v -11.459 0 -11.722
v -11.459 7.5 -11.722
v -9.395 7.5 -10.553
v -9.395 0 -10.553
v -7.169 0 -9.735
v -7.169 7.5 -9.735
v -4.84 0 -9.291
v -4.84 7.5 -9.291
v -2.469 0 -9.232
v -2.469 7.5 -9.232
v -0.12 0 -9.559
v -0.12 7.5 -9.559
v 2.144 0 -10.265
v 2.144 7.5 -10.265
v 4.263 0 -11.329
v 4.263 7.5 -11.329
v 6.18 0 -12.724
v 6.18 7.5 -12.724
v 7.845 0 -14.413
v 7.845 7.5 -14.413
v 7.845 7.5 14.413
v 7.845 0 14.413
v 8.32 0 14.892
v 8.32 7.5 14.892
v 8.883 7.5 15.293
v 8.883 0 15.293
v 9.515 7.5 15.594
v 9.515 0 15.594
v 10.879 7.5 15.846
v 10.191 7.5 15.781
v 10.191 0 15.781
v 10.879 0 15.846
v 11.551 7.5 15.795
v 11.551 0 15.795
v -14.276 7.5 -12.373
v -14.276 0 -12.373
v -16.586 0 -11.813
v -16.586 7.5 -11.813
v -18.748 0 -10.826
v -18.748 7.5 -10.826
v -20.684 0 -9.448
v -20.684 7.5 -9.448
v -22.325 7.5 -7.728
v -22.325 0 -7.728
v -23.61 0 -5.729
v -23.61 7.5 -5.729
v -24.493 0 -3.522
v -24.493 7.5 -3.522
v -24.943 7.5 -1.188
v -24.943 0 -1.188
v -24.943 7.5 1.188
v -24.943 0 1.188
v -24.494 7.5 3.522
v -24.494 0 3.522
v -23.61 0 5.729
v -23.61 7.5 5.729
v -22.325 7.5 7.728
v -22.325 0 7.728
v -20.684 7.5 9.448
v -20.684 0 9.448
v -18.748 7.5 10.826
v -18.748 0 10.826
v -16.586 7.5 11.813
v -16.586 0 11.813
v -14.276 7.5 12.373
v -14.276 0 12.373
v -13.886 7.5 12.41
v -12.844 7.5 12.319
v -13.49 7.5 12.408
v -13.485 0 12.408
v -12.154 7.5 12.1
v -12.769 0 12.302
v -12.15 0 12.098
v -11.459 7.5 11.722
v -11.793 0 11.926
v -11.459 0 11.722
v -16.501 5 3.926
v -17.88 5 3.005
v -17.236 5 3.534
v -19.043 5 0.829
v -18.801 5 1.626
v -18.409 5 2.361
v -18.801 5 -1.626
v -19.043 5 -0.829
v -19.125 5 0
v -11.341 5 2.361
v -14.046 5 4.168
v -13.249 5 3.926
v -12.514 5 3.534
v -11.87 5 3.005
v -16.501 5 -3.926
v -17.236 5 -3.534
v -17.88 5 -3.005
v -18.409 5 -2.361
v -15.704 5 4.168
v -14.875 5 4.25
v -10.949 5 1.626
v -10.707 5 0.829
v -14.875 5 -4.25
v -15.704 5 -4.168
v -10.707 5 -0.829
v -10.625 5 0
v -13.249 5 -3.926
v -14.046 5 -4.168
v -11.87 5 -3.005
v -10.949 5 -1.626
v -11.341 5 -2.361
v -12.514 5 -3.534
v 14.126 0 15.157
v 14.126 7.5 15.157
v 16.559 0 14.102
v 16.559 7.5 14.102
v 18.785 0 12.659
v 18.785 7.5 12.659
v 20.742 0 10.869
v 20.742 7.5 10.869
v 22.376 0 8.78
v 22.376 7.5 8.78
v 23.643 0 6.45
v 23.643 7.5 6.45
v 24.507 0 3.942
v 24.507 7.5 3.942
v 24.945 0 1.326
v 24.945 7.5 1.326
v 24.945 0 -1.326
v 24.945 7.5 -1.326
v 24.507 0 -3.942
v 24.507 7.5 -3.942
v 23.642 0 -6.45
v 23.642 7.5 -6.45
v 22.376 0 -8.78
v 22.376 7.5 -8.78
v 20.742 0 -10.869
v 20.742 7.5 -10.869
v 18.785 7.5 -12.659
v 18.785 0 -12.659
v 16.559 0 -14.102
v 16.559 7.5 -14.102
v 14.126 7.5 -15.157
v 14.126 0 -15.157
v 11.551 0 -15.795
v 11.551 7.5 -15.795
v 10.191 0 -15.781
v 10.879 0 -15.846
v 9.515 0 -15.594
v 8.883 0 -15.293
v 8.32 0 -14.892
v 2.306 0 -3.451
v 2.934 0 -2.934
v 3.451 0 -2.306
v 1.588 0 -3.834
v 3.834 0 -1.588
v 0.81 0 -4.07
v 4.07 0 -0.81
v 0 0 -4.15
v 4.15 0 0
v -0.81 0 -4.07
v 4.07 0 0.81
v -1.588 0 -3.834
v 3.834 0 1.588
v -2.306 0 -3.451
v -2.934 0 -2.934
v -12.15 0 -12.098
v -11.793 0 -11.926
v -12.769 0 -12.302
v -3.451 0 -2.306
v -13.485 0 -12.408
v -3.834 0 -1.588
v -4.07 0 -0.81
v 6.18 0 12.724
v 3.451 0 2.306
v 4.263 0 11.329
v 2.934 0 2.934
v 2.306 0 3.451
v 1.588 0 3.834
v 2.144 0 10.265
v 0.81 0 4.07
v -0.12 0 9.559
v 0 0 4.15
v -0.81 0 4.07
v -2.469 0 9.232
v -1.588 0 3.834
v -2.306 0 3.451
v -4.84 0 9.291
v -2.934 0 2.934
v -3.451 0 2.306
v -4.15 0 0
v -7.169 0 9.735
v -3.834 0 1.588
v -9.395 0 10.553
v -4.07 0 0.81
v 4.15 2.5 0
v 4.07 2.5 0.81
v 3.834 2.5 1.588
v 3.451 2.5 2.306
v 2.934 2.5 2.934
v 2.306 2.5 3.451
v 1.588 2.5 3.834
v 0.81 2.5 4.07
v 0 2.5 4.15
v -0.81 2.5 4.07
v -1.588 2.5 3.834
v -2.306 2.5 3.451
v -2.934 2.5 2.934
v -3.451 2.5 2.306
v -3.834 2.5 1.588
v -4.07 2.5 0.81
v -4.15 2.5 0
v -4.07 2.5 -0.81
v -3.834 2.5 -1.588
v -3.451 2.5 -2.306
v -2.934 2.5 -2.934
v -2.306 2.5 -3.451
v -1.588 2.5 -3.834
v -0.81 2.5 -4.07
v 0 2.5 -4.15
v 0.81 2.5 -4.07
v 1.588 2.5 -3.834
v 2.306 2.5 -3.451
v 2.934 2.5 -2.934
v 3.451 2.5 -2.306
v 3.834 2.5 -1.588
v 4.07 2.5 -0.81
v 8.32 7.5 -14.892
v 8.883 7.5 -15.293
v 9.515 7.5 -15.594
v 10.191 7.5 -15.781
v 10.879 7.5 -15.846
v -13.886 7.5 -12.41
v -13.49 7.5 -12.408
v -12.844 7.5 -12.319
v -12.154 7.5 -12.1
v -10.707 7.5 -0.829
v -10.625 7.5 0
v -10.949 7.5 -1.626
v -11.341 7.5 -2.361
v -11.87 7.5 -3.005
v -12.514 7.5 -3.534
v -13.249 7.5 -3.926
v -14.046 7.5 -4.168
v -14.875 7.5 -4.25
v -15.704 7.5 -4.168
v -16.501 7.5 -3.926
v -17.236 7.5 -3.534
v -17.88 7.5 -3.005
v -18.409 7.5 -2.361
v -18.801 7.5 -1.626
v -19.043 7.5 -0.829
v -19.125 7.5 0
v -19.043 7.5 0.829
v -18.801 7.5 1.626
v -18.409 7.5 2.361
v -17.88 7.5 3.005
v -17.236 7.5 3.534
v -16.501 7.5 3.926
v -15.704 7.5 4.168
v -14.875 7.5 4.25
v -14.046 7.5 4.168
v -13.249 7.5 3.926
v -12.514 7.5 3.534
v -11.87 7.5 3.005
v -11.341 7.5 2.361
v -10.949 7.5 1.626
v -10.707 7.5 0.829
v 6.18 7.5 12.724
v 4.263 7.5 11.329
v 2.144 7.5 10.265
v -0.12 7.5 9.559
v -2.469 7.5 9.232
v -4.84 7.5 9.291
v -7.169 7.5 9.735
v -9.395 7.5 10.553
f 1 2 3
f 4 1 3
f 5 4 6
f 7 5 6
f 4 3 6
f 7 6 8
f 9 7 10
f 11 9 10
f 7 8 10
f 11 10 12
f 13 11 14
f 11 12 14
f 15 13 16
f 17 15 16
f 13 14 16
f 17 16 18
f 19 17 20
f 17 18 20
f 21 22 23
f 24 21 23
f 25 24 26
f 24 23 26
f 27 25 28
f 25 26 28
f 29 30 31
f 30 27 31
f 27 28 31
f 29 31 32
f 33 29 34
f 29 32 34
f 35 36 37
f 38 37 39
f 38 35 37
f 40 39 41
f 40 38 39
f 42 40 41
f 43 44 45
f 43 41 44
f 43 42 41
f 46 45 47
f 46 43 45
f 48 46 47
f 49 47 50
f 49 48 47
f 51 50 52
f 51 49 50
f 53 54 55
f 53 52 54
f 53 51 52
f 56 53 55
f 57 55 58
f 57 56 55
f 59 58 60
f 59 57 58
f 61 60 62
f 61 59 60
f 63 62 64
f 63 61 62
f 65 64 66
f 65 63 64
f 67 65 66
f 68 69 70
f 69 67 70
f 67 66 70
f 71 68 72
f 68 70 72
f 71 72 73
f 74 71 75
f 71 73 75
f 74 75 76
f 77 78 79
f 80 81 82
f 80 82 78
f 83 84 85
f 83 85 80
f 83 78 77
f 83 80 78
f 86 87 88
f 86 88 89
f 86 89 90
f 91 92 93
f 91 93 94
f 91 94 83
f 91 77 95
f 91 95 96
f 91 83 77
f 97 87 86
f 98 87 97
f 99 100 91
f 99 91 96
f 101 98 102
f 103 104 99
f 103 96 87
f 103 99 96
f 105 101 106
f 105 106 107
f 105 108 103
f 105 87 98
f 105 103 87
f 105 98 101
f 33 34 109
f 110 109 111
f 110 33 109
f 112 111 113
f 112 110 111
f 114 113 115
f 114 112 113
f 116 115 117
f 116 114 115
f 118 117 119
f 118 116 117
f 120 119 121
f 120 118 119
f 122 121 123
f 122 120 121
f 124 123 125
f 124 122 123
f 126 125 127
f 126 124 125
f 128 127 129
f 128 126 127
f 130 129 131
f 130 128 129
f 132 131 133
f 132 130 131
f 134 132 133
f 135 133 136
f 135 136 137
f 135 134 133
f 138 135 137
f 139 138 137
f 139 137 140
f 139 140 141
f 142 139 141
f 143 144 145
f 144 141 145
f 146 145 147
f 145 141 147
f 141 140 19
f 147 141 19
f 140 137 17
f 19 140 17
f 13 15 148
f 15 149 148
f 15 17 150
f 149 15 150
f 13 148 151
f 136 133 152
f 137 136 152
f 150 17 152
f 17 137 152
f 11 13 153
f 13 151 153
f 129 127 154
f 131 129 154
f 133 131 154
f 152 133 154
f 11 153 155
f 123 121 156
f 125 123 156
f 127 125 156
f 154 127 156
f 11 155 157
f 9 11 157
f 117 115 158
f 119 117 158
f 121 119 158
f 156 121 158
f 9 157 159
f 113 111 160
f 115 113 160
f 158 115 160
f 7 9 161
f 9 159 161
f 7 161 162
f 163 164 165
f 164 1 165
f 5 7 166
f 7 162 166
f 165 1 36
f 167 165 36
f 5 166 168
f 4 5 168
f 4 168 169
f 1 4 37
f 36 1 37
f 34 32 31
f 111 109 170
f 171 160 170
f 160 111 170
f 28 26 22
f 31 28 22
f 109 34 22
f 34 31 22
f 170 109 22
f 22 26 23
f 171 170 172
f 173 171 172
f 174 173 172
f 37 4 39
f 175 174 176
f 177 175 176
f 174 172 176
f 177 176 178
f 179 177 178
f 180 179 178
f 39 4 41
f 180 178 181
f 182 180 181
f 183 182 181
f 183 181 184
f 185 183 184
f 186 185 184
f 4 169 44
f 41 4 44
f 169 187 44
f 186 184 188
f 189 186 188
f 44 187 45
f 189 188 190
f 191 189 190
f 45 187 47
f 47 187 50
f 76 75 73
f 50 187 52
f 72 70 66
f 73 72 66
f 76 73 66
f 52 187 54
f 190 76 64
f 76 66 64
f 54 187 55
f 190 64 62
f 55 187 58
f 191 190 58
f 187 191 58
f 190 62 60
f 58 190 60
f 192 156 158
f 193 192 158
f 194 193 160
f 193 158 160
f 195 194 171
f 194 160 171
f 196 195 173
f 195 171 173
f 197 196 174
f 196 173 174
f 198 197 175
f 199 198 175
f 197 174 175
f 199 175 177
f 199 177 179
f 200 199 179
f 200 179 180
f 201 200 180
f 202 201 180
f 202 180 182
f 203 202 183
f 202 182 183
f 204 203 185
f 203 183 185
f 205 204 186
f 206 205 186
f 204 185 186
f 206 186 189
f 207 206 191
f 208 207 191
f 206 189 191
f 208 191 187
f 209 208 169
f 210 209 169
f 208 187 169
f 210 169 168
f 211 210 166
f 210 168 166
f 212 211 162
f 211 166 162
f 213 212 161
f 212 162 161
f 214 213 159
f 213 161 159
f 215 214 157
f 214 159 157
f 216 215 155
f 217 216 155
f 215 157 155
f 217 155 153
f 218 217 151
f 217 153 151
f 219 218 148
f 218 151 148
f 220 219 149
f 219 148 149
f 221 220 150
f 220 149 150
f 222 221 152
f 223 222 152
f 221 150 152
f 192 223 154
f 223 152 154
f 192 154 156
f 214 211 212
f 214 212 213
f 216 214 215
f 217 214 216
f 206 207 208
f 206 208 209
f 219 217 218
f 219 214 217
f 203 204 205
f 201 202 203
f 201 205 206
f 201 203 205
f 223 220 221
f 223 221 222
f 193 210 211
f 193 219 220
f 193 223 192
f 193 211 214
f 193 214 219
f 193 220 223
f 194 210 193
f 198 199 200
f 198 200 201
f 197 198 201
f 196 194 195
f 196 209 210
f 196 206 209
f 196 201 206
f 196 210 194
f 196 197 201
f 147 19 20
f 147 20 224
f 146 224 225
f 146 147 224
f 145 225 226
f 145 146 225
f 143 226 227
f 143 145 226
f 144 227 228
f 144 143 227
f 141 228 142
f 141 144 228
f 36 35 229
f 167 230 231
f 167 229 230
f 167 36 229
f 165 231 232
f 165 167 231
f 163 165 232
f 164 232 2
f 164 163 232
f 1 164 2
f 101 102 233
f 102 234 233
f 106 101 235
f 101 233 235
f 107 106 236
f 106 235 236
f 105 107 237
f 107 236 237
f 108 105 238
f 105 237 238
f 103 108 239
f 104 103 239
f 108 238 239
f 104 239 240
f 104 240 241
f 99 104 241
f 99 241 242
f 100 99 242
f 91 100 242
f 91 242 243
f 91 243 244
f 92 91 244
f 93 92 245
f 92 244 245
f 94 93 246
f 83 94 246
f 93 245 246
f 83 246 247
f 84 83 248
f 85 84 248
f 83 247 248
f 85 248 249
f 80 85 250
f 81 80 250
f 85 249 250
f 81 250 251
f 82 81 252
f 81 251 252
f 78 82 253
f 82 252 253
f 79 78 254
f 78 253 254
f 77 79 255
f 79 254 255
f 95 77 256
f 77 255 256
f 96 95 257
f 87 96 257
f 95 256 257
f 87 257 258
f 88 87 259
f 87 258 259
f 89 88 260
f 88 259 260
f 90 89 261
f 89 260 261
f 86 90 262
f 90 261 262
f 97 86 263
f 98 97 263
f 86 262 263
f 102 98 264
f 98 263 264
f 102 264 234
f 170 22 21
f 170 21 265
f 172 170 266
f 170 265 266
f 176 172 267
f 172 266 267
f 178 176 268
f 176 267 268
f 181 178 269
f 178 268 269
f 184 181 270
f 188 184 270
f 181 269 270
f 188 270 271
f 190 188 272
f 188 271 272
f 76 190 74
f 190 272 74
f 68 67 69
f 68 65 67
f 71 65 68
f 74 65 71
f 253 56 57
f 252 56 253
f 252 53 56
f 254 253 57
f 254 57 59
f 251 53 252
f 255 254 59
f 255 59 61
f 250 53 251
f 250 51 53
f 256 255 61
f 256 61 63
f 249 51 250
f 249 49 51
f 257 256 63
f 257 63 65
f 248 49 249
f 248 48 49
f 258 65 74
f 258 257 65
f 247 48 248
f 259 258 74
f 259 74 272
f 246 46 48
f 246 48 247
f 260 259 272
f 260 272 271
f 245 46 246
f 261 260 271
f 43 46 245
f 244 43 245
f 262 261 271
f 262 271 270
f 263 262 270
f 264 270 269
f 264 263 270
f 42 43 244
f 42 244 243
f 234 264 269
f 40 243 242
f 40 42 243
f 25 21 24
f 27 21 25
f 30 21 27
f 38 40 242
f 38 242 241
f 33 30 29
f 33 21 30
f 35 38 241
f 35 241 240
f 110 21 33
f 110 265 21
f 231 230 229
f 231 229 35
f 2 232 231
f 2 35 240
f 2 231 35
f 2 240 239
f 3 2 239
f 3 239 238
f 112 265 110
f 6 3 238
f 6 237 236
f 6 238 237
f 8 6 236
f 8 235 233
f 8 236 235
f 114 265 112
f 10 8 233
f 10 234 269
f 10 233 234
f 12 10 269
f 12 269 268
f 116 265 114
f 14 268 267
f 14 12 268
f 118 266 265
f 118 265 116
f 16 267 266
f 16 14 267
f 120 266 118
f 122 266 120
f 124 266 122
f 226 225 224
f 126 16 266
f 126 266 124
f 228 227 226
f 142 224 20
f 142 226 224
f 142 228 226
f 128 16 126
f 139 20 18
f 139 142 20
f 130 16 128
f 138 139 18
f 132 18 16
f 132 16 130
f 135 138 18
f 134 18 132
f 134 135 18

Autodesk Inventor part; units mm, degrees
ref_plane "YZ Plane" through (0, 0, 0) normal (1, 0, 0) x (0, 1, 0)
ref_plane "XZ Plane" through (0, 0, 0) normal (0, 1, 0) x (-1, 0, 0)
ref_plane "XY Plane" through (0, 0, 0) normal (0, 0, 1) x (1, 0, 0)
sketch "Sketch1" plane through (0, 0, 0) normal (0, 1, 0) x (-1, 0, 0)
  circle A0 centre (0, 0) radius 25
  dimension "d0" = 50
extrude "Extrusion1" add sketch "Sketch1" along normal blind 10
sketch "Sketch2" plane through (0, 0, 0) normal (0, -1, 0) x (1, 0, 0)
  circle A0 centre (0, 0) radius 4.15
  dimension "d3" = 8.3
extrude "Extrusion2" cut sketch "Sketch2" against normal blind 2.5
sketch "Sketch8" plane through (0, 10, 0) normal (0, 1, 0) x (1, 0, 0)
  point P0 (0, 0)
sketch "Sketch9" plane through (0, 10, 0) normal (0, 1, 0) x (1, 0, 0)
  circle A0 centre (0, 0) radius 25 projected
  circle A1 centre (-12.5, 0) radius 12.5
  circle A2 centre (9, 0) radius 16
  arc A3 (9, -16) -> (-12.5, -12.5) centre (-3.2934, -23.7306) ccw
  arc A4 (-12.5, 12.5) -> (9, 16) centre (-3.2934, 23.7306) ccw
  point P0 (-25, 0)
  point P1 (25, 0)
  dimension "d17" = 32
extrude "Extrusion6" cut sketch "Sketch9" against normal blind 15 contours A2 A1 A0 | A0 A1 A2 | A4 A2 | A2 A3 | A1 A4 | A3 A1
fillet "Fillet3" radius 4 1 edges at (-12.5, 5, 12.5)
fillet "Fillet4" radius 4 1 edges at (9, 5, 16)
fillet "Fillet5" radius 4 1 edges at (-12.5, 5, -12.5)
fillet "Fillet6" radius 4 1 edges at (9, 5, -16)
sketch "Sketch10" plane through (0, 10, 0) normal (0, 1, 0) x (1, 0, 0)
  circle A0 centre (0, 0) radius 4.15 projected
  circle A1 centre (0, 0) radius 29.3218
extrude "Extrusion7" cut sketch "Sketch10" against normal blind 2.5 contours A0 | A1
sketch "Sketch11" plane through (0, 7.5, 0) normal (0, 1, 0) x (1, 0, 0)
  circle A0 centre (-14.875, 0) radius 4.25
  point P0 (0, 0)
  dimension "d26" = 8.5
extrude "Extrusion8" cut sketch "Sketch11" against normal blind 2.5
properties part number "Axel"
